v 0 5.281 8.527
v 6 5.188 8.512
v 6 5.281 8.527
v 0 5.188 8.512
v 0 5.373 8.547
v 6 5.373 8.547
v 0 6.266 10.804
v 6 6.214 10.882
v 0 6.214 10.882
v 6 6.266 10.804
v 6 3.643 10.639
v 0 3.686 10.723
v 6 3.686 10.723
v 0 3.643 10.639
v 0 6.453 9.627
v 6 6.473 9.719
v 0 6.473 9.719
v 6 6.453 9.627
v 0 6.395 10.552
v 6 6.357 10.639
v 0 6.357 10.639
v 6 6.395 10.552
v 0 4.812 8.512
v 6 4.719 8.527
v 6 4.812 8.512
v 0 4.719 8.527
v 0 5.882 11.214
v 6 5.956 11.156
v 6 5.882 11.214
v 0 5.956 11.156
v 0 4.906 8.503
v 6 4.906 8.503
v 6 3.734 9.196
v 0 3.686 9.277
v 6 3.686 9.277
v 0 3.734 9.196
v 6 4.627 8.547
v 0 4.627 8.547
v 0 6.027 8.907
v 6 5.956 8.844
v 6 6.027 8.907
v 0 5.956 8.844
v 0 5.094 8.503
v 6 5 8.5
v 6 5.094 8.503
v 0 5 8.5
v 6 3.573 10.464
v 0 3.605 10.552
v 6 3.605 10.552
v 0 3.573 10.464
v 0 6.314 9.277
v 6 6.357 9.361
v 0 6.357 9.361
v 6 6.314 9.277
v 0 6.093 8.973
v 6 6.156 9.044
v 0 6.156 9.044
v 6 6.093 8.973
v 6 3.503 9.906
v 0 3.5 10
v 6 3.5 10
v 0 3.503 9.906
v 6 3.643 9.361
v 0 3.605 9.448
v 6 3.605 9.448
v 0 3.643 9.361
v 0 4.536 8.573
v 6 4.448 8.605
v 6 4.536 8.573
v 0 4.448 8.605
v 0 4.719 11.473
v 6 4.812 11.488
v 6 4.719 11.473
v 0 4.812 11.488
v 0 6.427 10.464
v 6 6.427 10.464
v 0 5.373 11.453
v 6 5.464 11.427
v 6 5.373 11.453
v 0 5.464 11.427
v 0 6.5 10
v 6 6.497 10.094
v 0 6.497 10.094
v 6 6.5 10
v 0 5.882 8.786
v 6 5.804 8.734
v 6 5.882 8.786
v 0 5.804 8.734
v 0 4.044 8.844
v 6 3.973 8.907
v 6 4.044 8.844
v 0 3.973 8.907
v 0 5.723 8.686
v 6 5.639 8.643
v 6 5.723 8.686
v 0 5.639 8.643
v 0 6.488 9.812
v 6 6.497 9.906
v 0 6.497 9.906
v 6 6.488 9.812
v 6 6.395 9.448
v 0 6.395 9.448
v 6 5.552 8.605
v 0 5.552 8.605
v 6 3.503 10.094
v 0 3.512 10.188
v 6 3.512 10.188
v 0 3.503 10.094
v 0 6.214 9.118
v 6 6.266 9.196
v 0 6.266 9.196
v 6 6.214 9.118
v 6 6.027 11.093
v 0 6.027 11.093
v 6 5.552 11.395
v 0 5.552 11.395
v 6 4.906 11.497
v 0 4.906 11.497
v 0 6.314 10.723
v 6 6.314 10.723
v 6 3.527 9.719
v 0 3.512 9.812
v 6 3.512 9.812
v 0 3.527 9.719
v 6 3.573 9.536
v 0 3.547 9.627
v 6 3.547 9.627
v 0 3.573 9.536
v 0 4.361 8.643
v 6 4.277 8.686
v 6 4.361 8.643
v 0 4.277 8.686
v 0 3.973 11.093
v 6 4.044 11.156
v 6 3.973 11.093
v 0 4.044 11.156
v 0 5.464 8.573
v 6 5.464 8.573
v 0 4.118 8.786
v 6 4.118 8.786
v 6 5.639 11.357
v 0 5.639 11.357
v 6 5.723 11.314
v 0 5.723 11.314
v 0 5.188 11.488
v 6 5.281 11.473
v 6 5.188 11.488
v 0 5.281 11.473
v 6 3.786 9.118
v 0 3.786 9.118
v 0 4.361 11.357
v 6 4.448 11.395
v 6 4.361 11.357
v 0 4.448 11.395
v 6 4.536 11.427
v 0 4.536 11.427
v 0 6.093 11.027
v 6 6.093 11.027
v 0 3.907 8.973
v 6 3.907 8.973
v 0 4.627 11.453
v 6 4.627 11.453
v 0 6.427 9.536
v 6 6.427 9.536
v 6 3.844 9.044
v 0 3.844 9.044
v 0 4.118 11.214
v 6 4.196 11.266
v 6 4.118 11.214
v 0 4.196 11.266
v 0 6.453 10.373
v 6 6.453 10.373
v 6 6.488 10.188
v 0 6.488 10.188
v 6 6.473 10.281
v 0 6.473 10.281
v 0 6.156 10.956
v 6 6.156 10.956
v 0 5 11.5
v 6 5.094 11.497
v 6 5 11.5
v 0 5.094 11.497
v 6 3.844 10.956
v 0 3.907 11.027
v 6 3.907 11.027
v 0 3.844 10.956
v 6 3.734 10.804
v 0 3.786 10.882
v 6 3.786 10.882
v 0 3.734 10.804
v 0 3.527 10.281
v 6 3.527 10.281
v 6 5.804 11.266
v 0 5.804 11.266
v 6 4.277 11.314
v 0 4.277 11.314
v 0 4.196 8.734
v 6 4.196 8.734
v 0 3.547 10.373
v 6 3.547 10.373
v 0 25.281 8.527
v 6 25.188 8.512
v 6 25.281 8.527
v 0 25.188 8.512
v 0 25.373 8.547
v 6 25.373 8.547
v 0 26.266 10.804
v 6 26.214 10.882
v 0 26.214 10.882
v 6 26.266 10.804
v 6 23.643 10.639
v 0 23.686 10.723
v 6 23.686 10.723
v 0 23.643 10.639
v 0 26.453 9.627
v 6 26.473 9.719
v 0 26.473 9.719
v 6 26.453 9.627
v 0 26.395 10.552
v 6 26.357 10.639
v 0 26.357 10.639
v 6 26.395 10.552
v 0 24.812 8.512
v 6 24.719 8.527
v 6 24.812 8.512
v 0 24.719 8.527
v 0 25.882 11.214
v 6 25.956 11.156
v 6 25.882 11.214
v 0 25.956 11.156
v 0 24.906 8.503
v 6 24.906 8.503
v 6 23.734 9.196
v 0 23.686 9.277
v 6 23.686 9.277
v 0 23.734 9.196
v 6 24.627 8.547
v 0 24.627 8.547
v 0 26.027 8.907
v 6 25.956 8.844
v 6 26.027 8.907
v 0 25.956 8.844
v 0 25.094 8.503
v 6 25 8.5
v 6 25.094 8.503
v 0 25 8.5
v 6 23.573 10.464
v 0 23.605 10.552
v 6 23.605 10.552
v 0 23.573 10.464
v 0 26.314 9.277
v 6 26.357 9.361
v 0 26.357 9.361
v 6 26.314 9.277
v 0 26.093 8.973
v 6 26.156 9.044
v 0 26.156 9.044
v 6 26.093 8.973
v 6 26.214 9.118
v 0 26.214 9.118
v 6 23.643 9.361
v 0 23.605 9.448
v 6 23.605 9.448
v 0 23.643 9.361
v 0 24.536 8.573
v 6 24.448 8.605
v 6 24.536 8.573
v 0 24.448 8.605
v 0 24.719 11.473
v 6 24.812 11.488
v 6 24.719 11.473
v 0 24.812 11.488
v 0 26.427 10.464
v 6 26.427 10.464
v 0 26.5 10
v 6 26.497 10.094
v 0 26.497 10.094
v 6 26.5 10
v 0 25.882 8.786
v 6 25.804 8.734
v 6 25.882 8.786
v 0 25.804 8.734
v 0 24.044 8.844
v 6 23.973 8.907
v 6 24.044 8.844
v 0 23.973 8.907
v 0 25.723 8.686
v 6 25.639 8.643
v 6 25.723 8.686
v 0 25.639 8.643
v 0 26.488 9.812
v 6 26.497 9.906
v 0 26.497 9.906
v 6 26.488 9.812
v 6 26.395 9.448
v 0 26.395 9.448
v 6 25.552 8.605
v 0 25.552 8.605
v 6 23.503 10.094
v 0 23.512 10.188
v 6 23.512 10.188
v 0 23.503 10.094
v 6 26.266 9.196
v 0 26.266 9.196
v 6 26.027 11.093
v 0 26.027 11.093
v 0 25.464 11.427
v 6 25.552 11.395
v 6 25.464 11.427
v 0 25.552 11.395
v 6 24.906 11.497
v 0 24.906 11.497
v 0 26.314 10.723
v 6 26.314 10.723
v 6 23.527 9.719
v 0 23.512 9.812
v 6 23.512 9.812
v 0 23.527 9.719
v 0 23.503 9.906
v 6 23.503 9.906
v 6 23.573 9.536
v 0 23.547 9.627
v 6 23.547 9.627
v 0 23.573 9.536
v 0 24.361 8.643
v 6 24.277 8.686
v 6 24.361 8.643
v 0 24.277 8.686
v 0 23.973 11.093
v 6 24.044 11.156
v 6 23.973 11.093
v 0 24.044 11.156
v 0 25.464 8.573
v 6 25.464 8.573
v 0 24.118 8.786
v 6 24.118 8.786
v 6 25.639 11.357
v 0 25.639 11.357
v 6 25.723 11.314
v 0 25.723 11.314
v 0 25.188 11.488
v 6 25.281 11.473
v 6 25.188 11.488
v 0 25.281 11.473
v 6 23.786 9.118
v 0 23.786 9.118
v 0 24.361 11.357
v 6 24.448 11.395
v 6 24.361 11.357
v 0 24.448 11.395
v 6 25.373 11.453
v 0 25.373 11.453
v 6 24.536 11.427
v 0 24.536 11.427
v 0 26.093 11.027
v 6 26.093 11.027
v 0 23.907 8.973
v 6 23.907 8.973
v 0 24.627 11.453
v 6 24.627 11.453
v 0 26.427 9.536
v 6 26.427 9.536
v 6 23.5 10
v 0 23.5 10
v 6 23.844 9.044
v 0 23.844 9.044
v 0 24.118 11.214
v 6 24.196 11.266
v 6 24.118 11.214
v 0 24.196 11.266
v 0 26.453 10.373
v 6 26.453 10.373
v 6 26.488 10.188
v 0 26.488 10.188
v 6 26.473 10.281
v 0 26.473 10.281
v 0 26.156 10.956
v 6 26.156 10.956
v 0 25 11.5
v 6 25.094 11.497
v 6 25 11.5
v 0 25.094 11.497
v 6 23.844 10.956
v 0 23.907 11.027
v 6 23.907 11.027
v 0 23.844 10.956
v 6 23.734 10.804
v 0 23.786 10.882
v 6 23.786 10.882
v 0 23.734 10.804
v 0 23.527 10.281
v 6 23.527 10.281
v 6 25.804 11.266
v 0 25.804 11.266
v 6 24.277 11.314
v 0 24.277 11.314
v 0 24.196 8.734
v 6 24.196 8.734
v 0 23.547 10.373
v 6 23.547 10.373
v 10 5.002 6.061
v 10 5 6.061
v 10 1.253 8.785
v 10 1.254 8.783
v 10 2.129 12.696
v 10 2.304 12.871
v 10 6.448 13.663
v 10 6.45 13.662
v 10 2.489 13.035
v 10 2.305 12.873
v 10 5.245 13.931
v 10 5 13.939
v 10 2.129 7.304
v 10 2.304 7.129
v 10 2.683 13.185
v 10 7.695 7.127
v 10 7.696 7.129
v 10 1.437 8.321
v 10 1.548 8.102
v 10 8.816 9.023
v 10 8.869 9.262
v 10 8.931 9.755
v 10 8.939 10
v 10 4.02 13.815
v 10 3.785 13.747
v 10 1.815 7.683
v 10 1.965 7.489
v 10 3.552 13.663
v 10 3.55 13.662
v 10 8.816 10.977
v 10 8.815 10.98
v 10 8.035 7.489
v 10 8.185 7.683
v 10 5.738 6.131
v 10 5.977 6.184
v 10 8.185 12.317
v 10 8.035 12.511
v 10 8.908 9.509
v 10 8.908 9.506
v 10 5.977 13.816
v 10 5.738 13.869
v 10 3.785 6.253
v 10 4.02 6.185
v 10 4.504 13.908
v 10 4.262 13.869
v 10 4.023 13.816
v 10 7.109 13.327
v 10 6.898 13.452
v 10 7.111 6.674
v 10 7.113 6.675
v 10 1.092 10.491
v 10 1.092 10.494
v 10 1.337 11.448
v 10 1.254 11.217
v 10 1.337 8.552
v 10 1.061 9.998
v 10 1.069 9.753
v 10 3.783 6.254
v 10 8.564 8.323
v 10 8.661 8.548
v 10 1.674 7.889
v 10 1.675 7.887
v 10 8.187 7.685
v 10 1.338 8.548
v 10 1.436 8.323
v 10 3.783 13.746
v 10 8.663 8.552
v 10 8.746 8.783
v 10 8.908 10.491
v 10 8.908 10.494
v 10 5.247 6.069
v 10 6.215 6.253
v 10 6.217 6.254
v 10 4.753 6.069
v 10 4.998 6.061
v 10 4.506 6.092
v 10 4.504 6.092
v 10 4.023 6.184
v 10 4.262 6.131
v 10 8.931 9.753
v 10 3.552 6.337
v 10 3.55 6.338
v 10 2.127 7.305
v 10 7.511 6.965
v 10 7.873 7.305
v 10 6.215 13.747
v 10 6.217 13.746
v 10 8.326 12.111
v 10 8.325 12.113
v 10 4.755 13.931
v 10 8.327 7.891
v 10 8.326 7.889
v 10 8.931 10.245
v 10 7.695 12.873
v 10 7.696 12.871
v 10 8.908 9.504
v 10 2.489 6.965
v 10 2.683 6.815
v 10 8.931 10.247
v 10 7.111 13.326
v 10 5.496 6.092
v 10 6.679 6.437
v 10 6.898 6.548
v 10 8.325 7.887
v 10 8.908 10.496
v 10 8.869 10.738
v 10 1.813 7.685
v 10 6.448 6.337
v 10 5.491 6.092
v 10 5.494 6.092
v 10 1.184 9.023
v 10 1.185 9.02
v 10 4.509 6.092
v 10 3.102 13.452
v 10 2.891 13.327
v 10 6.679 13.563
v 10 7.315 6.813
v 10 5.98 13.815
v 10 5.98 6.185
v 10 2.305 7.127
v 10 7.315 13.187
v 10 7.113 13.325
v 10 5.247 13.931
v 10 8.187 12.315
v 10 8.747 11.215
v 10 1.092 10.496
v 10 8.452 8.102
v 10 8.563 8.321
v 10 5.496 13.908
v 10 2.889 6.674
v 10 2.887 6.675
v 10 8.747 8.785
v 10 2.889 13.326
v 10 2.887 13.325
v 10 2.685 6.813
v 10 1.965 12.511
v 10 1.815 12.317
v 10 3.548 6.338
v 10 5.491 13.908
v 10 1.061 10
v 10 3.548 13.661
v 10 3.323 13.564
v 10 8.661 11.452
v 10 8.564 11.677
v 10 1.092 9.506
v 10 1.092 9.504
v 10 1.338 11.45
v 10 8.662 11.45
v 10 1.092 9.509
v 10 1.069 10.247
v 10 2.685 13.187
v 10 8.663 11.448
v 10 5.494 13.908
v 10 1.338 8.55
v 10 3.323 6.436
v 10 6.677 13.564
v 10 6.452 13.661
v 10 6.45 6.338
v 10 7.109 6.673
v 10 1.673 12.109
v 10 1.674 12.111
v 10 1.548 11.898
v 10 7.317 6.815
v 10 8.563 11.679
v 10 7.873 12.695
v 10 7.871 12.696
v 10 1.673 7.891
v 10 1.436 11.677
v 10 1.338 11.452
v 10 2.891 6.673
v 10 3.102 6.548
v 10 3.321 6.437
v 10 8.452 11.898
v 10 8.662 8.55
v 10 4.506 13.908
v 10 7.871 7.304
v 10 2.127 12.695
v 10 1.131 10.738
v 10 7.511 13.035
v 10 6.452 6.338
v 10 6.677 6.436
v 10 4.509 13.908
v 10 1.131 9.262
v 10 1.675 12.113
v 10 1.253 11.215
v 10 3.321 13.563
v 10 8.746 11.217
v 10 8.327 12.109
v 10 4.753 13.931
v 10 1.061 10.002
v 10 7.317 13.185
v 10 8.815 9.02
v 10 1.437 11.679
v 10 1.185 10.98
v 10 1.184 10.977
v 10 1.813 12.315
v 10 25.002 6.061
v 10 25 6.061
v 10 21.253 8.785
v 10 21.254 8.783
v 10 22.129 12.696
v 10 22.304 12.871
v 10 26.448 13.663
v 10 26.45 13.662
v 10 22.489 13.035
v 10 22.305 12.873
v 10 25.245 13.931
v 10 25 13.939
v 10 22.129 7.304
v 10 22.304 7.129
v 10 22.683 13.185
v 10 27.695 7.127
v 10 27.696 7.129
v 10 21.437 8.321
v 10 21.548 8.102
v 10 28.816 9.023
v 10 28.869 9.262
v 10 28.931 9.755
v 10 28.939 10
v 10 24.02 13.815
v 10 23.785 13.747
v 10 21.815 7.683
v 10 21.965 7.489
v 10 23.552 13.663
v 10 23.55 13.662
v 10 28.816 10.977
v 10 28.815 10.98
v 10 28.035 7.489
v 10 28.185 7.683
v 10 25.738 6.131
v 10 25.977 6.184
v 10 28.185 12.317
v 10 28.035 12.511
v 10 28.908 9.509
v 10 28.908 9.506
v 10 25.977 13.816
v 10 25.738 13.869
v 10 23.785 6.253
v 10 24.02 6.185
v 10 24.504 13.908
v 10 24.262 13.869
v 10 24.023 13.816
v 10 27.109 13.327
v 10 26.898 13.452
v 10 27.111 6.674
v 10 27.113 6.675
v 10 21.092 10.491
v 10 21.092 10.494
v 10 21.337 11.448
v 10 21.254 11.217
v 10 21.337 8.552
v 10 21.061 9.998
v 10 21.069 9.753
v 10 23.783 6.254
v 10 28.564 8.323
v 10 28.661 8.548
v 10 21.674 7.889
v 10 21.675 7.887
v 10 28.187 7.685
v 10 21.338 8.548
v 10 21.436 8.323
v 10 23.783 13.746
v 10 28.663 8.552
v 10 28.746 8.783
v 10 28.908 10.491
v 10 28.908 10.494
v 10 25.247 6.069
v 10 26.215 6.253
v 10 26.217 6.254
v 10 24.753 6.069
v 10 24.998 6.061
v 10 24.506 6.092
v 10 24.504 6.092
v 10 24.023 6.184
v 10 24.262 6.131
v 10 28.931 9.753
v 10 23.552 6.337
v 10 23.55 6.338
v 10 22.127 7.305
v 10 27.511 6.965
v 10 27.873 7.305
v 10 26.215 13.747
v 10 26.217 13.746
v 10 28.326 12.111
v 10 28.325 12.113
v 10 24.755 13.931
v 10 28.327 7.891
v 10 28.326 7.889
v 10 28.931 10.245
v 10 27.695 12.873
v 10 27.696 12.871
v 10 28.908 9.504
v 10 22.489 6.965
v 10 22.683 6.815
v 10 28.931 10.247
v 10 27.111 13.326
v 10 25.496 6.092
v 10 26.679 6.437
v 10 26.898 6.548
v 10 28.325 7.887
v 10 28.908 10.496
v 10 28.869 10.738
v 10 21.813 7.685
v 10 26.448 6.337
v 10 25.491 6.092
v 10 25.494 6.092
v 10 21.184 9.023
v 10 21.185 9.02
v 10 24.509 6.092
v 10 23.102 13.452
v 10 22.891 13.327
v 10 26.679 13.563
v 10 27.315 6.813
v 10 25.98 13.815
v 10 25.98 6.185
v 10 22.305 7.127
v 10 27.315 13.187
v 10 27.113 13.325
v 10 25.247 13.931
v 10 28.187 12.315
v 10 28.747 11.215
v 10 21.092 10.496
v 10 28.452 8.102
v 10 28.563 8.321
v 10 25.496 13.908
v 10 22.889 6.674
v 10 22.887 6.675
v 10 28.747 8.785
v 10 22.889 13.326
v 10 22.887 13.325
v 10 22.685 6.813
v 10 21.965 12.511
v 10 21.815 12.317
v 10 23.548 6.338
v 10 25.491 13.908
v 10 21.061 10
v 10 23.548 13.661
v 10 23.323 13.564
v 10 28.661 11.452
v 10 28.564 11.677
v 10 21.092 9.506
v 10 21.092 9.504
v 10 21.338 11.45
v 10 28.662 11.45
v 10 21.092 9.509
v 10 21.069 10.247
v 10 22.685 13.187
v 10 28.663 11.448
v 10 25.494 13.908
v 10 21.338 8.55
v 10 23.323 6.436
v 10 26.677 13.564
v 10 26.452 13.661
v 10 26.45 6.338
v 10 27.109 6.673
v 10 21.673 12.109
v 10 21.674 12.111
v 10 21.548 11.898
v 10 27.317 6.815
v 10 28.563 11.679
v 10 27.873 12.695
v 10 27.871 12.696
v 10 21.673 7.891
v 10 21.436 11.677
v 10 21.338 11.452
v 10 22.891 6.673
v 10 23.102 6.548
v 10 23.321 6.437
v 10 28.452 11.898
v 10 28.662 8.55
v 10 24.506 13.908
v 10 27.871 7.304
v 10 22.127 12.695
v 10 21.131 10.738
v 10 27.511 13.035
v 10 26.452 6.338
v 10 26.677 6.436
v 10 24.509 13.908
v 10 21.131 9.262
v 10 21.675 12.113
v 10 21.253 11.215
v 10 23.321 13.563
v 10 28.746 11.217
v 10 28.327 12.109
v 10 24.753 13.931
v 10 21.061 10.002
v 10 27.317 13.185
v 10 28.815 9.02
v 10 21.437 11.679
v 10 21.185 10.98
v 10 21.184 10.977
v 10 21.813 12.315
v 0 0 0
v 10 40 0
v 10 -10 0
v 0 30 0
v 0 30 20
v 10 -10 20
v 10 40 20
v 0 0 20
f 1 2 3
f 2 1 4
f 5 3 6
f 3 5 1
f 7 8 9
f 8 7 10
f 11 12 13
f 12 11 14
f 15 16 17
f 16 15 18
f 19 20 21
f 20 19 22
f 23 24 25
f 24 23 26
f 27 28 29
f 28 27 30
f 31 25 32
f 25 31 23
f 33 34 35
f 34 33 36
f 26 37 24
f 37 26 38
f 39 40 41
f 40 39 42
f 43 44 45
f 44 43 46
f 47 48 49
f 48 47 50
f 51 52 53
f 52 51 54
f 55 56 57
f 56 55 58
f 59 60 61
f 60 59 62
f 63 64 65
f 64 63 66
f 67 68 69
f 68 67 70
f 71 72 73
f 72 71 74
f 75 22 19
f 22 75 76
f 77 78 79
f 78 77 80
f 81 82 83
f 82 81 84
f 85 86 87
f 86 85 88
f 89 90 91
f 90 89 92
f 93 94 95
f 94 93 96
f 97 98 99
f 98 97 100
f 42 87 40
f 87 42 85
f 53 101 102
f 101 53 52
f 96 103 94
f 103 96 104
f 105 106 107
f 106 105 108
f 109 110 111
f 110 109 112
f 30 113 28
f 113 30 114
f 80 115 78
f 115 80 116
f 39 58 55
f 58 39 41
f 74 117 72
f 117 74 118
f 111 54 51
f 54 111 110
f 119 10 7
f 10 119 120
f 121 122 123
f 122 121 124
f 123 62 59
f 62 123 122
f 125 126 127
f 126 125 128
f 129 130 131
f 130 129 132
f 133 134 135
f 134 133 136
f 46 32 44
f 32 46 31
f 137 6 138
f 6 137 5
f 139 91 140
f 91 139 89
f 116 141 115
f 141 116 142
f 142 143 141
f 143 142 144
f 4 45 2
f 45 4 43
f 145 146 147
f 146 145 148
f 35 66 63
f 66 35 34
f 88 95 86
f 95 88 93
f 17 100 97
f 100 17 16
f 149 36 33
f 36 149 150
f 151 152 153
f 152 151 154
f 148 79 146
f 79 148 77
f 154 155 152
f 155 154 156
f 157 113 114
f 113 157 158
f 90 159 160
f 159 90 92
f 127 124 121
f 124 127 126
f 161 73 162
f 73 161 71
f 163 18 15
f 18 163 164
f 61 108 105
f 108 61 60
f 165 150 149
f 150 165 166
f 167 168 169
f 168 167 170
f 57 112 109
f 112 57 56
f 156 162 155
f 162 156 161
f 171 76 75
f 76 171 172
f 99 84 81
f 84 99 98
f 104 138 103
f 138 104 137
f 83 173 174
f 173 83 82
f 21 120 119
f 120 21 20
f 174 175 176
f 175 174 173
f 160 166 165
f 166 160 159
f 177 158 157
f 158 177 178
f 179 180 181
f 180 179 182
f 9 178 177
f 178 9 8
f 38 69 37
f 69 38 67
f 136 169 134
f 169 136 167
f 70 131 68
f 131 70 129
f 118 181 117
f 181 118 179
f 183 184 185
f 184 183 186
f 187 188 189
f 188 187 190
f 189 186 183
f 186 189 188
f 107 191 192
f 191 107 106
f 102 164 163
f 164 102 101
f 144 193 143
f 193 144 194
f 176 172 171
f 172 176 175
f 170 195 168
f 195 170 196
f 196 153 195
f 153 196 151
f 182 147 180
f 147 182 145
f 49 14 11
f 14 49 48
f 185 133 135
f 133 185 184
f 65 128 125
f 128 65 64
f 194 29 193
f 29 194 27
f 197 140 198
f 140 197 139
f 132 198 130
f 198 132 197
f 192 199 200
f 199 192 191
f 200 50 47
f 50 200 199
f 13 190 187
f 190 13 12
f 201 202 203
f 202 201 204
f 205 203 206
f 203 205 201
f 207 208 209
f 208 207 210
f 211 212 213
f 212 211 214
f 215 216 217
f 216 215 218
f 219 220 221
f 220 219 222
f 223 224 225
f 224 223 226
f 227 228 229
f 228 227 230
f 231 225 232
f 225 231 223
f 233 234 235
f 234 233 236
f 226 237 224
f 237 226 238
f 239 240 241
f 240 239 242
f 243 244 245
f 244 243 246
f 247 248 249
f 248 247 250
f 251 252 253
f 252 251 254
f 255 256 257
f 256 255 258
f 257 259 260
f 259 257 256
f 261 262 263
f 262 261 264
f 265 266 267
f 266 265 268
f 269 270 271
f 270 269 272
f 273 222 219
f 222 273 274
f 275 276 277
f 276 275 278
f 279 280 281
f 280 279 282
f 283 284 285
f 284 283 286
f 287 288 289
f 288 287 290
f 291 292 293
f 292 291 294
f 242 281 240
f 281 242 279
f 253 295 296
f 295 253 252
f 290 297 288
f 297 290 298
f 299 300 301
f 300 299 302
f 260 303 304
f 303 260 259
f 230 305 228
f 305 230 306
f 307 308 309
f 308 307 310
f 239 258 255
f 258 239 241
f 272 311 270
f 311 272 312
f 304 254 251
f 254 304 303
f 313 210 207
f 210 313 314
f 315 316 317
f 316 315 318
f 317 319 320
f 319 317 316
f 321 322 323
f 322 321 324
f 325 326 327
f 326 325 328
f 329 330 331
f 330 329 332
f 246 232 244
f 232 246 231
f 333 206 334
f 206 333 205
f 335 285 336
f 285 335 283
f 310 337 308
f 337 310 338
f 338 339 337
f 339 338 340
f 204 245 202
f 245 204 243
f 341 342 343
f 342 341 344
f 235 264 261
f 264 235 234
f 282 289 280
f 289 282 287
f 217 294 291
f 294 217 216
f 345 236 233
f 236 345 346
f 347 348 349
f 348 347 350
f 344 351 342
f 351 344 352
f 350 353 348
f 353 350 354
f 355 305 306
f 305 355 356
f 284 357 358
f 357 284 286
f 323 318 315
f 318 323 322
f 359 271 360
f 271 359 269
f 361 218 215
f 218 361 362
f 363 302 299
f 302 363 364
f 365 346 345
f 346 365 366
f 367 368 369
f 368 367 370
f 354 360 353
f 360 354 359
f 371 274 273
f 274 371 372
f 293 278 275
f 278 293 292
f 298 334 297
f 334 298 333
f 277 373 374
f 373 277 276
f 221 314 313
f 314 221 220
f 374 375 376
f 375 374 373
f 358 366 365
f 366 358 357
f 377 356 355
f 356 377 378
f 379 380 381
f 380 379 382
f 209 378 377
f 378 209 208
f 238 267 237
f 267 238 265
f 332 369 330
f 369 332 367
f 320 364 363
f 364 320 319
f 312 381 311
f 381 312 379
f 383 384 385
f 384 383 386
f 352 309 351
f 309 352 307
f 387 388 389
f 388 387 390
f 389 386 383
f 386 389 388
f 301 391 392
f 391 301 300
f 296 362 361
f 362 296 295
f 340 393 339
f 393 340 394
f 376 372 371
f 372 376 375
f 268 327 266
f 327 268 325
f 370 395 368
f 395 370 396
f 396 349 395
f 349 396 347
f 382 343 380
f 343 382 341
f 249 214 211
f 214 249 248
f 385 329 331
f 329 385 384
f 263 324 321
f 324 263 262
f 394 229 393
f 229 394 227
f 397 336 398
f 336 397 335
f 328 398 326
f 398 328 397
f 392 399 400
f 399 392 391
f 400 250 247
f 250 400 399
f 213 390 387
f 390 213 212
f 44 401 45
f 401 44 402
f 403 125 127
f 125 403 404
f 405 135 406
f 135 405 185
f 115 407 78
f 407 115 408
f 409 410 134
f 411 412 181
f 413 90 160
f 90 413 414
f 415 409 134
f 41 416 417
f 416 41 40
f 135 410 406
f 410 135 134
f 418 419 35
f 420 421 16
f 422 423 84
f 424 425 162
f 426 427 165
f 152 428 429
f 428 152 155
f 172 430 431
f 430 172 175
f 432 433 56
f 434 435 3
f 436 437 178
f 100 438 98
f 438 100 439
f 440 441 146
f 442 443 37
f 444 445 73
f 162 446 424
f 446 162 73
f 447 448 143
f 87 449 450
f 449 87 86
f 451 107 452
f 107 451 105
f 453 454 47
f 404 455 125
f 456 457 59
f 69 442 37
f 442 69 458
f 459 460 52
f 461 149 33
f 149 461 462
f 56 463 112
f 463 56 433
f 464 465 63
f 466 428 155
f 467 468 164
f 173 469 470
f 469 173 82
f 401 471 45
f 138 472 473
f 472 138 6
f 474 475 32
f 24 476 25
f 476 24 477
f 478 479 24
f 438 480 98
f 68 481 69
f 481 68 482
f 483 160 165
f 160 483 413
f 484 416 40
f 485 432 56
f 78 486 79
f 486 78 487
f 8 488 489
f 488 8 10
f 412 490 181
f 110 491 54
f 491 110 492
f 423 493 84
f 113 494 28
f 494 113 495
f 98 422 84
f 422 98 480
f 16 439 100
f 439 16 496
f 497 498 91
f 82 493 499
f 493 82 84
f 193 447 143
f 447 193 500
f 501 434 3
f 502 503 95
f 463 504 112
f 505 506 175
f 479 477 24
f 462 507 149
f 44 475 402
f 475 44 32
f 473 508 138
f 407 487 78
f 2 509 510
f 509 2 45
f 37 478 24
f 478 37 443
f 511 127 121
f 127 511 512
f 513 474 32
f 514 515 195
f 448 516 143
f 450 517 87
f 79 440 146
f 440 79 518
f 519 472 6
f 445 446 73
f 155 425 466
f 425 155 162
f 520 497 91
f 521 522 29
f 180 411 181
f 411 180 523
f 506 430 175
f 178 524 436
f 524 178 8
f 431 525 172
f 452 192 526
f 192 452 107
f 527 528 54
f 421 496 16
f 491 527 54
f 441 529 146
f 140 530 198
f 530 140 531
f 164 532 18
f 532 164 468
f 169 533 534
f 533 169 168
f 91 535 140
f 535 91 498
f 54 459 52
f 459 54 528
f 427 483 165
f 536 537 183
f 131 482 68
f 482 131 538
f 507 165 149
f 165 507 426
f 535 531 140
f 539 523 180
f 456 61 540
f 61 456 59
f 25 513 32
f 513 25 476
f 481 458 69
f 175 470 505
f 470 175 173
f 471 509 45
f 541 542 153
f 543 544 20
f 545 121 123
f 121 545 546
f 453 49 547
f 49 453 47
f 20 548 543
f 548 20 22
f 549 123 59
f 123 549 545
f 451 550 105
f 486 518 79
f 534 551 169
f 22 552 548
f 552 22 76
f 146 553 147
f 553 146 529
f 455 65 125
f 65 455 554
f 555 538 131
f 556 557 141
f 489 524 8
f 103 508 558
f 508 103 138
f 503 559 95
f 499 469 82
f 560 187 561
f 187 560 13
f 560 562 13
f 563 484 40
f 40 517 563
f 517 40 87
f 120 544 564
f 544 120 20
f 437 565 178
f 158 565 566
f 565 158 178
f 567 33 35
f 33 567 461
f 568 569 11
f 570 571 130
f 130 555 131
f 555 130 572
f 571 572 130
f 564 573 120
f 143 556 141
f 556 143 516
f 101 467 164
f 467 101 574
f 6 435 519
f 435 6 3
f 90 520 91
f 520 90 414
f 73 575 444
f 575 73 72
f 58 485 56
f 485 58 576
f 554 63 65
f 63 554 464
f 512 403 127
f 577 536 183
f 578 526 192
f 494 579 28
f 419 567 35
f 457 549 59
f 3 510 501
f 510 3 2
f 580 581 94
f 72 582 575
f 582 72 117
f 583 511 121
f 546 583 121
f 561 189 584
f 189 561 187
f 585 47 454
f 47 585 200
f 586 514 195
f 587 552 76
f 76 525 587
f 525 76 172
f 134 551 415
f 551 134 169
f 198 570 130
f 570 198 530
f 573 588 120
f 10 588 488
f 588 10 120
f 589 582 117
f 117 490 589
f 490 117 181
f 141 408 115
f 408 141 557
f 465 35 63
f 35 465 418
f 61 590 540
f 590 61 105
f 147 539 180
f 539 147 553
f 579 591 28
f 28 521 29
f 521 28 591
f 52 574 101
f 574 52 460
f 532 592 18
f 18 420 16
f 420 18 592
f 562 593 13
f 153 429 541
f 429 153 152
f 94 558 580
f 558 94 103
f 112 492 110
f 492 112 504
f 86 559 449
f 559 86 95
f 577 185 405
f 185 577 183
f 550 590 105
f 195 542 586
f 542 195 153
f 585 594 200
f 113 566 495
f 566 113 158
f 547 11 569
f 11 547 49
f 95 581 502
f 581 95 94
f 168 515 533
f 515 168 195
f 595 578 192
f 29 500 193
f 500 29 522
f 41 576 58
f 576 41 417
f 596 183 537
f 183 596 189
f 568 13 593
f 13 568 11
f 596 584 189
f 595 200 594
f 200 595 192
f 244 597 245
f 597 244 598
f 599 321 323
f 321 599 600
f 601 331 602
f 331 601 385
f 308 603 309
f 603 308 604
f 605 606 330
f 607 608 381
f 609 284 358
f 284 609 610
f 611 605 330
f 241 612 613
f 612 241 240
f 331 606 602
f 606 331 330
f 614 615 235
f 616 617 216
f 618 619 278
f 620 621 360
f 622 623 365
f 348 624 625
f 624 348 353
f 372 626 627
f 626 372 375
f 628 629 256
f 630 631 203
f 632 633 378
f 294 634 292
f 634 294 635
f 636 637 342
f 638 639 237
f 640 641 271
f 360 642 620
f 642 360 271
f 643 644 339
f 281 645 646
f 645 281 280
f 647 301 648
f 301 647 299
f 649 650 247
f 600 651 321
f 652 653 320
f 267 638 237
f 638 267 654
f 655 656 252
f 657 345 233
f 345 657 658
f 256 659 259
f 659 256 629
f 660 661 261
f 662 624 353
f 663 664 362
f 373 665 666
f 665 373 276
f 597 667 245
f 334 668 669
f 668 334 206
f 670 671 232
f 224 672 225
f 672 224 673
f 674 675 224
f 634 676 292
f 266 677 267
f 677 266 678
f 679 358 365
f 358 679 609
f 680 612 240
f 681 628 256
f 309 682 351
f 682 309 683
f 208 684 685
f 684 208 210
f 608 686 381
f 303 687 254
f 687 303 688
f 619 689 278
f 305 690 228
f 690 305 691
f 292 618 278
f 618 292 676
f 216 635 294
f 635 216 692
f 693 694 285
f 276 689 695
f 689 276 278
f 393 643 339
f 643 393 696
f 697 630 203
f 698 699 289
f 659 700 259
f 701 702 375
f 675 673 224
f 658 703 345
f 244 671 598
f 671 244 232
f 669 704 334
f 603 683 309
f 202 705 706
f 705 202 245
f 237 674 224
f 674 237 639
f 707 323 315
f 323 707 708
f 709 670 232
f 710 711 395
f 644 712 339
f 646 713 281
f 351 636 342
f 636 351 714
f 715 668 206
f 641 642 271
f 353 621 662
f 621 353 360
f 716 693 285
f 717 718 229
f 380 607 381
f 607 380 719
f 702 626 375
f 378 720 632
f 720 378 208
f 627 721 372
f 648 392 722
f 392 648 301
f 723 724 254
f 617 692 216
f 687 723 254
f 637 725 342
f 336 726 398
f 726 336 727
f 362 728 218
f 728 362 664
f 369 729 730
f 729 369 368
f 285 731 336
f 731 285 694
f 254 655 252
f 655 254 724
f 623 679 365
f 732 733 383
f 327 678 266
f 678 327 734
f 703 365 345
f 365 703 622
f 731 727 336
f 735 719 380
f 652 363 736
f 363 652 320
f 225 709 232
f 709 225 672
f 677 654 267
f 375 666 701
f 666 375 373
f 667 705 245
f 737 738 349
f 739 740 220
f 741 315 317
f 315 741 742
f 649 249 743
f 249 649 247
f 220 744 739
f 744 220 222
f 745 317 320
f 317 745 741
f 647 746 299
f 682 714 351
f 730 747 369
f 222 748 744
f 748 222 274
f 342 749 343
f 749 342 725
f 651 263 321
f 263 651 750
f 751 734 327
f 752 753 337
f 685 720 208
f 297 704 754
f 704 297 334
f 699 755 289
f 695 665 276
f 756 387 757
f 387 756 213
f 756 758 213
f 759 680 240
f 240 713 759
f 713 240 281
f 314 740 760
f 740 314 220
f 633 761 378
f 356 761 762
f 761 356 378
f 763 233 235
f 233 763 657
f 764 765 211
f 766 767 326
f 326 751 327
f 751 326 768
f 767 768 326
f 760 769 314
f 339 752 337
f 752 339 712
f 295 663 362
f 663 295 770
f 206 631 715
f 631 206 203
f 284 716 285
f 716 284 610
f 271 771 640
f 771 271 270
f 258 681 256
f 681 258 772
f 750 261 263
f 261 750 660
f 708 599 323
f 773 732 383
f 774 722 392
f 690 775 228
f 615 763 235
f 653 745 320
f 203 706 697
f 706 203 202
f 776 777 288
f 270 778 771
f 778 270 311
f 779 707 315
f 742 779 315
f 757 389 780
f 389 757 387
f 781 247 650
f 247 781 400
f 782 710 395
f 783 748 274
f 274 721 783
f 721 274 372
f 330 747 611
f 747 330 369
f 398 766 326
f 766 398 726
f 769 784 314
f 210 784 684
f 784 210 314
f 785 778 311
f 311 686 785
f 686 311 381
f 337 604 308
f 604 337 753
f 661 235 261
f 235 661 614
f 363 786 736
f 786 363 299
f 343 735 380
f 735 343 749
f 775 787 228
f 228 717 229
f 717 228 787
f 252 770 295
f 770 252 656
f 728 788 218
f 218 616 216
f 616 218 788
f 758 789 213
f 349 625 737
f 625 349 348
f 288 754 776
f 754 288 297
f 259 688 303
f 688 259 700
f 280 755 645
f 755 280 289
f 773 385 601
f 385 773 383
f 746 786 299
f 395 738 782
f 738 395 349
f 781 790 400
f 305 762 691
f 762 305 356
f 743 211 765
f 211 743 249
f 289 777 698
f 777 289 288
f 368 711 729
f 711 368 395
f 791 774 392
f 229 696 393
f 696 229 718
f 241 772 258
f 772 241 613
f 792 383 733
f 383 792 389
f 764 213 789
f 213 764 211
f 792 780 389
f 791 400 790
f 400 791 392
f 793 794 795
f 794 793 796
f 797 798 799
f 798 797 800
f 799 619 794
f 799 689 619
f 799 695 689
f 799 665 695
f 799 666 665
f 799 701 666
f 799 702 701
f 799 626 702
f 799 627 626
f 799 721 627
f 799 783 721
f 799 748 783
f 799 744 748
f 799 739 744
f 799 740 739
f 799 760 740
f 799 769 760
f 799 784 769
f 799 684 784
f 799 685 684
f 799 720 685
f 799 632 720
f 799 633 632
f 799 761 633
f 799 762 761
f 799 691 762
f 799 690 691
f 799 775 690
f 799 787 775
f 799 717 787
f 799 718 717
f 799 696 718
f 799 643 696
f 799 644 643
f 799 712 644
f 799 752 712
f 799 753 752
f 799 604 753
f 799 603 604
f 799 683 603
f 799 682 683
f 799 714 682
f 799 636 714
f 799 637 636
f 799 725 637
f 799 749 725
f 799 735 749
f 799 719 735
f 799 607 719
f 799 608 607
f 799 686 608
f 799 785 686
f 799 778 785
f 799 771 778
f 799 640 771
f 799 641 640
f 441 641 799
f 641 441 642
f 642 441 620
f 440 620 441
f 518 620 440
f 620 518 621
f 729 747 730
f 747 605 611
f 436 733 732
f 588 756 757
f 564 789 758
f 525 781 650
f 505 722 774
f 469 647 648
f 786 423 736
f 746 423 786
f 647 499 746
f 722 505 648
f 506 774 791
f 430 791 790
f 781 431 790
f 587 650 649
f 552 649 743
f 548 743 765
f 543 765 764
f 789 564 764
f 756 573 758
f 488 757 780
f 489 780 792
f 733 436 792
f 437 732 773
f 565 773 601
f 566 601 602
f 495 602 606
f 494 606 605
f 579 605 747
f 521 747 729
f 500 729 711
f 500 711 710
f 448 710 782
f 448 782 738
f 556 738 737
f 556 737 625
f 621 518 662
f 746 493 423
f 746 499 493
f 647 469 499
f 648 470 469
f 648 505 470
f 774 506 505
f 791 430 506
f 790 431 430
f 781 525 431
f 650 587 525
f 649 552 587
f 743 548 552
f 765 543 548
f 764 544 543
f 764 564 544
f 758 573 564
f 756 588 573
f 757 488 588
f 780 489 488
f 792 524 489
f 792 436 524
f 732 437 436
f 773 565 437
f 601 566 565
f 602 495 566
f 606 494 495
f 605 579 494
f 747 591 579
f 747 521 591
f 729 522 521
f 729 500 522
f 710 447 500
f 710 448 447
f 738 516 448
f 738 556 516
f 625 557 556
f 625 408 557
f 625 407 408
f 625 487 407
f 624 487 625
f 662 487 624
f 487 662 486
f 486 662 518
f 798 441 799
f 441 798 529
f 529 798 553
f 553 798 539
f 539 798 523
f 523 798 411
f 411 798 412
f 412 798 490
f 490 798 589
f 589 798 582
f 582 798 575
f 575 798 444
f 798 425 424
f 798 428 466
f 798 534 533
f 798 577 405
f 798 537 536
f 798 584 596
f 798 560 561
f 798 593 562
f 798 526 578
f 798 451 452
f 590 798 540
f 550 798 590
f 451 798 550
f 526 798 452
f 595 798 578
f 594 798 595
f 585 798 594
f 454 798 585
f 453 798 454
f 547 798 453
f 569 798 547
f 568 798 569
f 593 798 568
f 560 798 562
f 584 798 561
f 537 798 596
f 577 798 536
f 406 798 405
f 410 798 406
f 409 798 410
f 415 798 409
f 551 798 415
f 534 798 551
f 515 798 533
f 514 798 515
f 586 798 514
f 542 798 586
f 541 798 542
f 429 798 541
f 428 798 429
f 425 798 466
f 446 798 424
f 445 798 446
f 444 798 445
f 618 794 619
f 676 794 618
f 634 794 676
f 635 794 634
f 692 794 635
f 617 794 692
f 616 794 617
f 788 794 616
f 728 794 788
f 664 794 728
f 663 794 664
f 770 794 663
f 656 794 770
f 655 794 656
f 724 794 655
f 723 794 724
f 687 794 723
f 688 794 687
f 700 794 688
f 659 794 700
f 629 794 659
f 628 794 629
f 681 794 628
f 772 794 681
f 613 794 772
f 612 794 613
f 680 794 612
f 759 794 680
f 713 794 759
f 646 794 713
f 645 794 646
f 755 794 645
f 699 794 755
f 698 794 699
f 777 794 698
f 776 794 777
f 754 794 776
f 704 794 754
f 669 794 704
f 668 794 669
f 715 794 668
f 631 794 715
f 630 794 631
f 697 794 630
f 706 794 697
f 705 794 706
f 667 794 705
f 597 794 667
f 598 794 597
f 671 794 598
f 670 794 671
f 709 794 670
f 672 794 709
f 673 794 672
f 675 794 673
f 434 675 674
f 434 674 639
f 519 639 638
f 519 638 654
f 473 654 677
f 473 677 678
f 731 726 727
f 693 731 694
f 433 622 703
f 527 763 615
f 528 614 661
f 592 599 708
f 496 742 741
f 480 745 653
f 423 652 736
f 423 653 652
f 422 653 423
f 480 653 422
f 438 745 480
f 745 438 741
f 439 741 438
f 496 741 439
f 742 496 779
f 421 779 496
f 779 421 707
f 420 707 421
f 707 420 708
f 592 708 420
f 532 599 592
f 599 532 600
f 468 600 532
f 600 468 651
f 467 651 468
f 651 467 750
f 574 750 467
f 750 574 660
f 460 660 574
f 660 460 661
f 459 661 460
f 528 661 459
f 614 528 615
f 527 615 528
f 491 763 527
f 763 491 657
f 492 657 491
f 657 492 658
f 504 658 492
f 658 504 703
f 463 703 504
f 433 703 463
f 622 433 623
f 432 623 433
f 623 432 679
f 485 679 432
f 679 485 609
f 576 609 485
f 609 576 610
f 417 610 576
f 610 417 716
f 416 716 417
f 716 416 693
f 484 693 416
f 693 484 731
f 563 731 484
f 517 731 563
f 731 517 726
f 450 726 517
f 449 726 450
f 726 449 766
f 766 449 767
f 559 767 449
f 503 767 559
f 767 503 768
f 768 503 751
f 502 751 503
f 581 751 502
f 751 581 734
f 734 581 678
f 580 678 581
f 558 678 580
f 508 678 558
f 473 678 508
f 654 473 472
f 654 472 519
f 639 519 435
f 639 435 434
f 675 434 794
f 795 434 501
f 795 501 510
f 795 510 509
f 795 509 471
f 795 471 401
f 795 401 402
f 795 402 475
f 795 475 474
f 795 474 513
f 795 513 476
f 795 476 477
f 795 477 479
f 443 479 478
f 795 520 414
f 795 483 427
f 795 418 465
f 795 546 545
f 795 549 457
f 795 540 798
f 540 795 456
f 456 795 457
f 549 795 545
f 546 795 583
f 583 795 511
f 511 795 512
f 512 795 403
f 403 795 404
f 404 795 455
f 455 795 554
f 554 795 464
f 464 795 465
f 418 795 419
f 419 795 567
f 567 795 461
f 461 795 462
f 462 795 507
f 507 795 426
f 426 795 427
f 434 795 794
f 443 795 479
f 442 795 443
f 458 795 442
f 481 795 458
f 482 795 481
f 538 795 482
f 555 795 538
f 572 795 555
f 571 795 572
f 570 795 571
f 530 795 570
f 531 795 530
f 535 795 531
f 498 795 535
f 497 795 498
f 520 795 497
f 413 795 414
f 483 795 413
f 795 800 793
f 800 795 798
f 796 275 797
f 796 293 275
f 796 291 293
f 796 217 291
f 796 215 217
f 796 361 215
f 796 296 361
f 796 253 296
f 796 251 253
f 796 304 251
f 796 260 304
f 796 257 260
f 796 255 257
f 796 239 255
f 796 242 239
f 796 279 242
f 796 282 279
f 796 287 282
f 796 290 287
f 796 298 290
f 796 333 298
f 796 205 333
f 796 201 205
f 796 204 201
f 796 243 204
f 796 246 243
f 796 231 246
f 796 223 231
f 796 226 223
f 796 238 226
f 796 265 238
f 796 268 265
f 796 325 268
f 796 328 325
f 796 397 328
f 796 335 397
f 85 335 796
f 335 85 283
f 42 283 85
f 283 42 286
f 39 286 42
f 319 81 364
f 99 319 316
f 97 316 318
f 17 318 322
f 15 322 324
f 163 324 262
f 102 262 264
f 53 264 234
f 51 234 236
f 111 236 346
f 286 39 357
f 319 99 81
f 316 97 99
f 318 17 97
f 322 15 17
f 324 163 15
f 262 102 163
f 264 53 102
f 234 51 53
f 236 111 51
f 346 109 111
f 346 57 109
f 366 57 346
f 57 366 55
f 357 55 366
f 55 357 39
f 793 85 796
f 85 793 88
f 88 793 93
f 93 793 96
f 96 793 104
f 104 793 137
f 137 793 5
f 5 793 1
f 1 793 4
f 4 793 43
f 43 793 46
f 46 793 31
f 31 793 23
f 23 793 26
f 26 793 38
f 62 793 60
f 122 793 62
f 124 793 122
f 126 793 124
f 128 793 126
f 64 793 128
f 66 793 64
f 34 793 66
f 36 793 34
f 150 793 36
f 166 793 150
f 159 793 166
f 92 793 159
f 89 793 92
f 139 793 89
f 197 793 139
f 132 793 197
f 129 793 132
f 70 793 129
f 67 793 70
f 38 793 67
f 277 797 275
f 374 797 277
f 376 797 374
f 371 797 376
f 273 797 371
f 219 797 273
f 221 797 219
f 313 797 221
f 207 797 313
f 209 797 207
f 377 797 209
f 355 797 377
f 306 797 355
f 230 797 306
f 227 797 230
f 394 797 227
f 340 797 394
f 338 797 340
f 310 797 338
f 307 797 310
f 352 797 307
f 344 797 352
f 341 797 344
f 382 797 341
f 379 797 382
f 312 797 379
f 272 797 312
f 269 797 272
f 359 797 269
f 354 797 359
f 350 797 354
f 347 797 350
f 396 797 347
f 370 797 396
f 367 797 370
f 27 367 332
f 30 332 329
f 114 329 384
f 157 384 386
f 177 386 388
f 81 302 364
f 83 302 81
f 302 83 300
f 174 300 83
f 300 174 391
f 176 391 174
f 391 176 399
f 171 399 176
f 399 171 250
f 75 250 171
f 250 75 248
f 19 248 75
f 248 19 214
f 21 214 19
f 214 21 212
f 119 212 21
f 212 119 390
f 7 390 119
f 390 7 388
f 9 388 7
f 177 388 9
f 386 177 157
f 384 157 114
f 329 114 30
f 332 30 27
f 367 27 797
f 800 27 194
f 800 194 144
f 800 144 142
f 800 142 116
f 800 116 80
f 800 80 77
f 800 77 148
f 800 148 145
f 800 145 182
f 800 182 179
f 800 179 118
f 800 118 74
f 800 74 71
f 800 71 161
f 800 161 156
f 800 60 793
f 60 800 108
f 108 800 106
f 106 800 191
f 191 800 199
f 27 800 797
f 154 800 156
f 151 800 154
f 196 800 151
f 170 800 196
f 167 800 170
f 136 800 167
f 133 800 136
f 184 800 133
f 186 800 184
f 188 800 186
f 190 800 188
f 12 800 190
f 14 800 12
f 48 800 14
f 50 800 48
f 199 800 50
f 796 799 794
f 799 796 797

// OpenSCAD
$fn = 100;

dovetail_final();
//hook_final();

module hook_final() {
    translate([70, -85, 0])
    cube([10, 200, 22]);

    translate([30.1, 105, 0.1])
    cube([40, 10, 22]);

    translate([20.1, -15, 0.1])
    linear_extrude(22)
    polygon([
        [0, 0],
        [0, 60],
        [0, 120],
        [10, 130],
        [10, 0]
    ]);

    difference() {
        union() {
            translate([0.1, -15, 0.1])
            cube([20, 60, 22]);
        }

        dovetail();
    }
}

module dovetail_final() {
    difference() {
        dovetail();
        union() {
            // screw holes
            translate([-1, 5, 10])
            rotate([0, 90, 0])
            cylinder(h = 20, r = 1.5);
            translate([-1, 25, 10])
            rotate([0, 90, 0])
            cylinder(h = 20, r = 1.5);
            // screw heads
            translate([6, 5, 10])
            rotate([0, 90, 0])
            cylinder(h = 4.1, r1 = 1.5, r2 = 4);
            translate([6, 25, 10])
            rotate([0, 90, 0])
            cylinder(h = 4.1, r1 = 1.5, r2 = 4);
        }
    }
}

module dovetail() {
    linear_extrude(20)
    polygon([
        [0,0],
        [10,-10],
        [10, 40],
        [0, 30]
    ]);
}
